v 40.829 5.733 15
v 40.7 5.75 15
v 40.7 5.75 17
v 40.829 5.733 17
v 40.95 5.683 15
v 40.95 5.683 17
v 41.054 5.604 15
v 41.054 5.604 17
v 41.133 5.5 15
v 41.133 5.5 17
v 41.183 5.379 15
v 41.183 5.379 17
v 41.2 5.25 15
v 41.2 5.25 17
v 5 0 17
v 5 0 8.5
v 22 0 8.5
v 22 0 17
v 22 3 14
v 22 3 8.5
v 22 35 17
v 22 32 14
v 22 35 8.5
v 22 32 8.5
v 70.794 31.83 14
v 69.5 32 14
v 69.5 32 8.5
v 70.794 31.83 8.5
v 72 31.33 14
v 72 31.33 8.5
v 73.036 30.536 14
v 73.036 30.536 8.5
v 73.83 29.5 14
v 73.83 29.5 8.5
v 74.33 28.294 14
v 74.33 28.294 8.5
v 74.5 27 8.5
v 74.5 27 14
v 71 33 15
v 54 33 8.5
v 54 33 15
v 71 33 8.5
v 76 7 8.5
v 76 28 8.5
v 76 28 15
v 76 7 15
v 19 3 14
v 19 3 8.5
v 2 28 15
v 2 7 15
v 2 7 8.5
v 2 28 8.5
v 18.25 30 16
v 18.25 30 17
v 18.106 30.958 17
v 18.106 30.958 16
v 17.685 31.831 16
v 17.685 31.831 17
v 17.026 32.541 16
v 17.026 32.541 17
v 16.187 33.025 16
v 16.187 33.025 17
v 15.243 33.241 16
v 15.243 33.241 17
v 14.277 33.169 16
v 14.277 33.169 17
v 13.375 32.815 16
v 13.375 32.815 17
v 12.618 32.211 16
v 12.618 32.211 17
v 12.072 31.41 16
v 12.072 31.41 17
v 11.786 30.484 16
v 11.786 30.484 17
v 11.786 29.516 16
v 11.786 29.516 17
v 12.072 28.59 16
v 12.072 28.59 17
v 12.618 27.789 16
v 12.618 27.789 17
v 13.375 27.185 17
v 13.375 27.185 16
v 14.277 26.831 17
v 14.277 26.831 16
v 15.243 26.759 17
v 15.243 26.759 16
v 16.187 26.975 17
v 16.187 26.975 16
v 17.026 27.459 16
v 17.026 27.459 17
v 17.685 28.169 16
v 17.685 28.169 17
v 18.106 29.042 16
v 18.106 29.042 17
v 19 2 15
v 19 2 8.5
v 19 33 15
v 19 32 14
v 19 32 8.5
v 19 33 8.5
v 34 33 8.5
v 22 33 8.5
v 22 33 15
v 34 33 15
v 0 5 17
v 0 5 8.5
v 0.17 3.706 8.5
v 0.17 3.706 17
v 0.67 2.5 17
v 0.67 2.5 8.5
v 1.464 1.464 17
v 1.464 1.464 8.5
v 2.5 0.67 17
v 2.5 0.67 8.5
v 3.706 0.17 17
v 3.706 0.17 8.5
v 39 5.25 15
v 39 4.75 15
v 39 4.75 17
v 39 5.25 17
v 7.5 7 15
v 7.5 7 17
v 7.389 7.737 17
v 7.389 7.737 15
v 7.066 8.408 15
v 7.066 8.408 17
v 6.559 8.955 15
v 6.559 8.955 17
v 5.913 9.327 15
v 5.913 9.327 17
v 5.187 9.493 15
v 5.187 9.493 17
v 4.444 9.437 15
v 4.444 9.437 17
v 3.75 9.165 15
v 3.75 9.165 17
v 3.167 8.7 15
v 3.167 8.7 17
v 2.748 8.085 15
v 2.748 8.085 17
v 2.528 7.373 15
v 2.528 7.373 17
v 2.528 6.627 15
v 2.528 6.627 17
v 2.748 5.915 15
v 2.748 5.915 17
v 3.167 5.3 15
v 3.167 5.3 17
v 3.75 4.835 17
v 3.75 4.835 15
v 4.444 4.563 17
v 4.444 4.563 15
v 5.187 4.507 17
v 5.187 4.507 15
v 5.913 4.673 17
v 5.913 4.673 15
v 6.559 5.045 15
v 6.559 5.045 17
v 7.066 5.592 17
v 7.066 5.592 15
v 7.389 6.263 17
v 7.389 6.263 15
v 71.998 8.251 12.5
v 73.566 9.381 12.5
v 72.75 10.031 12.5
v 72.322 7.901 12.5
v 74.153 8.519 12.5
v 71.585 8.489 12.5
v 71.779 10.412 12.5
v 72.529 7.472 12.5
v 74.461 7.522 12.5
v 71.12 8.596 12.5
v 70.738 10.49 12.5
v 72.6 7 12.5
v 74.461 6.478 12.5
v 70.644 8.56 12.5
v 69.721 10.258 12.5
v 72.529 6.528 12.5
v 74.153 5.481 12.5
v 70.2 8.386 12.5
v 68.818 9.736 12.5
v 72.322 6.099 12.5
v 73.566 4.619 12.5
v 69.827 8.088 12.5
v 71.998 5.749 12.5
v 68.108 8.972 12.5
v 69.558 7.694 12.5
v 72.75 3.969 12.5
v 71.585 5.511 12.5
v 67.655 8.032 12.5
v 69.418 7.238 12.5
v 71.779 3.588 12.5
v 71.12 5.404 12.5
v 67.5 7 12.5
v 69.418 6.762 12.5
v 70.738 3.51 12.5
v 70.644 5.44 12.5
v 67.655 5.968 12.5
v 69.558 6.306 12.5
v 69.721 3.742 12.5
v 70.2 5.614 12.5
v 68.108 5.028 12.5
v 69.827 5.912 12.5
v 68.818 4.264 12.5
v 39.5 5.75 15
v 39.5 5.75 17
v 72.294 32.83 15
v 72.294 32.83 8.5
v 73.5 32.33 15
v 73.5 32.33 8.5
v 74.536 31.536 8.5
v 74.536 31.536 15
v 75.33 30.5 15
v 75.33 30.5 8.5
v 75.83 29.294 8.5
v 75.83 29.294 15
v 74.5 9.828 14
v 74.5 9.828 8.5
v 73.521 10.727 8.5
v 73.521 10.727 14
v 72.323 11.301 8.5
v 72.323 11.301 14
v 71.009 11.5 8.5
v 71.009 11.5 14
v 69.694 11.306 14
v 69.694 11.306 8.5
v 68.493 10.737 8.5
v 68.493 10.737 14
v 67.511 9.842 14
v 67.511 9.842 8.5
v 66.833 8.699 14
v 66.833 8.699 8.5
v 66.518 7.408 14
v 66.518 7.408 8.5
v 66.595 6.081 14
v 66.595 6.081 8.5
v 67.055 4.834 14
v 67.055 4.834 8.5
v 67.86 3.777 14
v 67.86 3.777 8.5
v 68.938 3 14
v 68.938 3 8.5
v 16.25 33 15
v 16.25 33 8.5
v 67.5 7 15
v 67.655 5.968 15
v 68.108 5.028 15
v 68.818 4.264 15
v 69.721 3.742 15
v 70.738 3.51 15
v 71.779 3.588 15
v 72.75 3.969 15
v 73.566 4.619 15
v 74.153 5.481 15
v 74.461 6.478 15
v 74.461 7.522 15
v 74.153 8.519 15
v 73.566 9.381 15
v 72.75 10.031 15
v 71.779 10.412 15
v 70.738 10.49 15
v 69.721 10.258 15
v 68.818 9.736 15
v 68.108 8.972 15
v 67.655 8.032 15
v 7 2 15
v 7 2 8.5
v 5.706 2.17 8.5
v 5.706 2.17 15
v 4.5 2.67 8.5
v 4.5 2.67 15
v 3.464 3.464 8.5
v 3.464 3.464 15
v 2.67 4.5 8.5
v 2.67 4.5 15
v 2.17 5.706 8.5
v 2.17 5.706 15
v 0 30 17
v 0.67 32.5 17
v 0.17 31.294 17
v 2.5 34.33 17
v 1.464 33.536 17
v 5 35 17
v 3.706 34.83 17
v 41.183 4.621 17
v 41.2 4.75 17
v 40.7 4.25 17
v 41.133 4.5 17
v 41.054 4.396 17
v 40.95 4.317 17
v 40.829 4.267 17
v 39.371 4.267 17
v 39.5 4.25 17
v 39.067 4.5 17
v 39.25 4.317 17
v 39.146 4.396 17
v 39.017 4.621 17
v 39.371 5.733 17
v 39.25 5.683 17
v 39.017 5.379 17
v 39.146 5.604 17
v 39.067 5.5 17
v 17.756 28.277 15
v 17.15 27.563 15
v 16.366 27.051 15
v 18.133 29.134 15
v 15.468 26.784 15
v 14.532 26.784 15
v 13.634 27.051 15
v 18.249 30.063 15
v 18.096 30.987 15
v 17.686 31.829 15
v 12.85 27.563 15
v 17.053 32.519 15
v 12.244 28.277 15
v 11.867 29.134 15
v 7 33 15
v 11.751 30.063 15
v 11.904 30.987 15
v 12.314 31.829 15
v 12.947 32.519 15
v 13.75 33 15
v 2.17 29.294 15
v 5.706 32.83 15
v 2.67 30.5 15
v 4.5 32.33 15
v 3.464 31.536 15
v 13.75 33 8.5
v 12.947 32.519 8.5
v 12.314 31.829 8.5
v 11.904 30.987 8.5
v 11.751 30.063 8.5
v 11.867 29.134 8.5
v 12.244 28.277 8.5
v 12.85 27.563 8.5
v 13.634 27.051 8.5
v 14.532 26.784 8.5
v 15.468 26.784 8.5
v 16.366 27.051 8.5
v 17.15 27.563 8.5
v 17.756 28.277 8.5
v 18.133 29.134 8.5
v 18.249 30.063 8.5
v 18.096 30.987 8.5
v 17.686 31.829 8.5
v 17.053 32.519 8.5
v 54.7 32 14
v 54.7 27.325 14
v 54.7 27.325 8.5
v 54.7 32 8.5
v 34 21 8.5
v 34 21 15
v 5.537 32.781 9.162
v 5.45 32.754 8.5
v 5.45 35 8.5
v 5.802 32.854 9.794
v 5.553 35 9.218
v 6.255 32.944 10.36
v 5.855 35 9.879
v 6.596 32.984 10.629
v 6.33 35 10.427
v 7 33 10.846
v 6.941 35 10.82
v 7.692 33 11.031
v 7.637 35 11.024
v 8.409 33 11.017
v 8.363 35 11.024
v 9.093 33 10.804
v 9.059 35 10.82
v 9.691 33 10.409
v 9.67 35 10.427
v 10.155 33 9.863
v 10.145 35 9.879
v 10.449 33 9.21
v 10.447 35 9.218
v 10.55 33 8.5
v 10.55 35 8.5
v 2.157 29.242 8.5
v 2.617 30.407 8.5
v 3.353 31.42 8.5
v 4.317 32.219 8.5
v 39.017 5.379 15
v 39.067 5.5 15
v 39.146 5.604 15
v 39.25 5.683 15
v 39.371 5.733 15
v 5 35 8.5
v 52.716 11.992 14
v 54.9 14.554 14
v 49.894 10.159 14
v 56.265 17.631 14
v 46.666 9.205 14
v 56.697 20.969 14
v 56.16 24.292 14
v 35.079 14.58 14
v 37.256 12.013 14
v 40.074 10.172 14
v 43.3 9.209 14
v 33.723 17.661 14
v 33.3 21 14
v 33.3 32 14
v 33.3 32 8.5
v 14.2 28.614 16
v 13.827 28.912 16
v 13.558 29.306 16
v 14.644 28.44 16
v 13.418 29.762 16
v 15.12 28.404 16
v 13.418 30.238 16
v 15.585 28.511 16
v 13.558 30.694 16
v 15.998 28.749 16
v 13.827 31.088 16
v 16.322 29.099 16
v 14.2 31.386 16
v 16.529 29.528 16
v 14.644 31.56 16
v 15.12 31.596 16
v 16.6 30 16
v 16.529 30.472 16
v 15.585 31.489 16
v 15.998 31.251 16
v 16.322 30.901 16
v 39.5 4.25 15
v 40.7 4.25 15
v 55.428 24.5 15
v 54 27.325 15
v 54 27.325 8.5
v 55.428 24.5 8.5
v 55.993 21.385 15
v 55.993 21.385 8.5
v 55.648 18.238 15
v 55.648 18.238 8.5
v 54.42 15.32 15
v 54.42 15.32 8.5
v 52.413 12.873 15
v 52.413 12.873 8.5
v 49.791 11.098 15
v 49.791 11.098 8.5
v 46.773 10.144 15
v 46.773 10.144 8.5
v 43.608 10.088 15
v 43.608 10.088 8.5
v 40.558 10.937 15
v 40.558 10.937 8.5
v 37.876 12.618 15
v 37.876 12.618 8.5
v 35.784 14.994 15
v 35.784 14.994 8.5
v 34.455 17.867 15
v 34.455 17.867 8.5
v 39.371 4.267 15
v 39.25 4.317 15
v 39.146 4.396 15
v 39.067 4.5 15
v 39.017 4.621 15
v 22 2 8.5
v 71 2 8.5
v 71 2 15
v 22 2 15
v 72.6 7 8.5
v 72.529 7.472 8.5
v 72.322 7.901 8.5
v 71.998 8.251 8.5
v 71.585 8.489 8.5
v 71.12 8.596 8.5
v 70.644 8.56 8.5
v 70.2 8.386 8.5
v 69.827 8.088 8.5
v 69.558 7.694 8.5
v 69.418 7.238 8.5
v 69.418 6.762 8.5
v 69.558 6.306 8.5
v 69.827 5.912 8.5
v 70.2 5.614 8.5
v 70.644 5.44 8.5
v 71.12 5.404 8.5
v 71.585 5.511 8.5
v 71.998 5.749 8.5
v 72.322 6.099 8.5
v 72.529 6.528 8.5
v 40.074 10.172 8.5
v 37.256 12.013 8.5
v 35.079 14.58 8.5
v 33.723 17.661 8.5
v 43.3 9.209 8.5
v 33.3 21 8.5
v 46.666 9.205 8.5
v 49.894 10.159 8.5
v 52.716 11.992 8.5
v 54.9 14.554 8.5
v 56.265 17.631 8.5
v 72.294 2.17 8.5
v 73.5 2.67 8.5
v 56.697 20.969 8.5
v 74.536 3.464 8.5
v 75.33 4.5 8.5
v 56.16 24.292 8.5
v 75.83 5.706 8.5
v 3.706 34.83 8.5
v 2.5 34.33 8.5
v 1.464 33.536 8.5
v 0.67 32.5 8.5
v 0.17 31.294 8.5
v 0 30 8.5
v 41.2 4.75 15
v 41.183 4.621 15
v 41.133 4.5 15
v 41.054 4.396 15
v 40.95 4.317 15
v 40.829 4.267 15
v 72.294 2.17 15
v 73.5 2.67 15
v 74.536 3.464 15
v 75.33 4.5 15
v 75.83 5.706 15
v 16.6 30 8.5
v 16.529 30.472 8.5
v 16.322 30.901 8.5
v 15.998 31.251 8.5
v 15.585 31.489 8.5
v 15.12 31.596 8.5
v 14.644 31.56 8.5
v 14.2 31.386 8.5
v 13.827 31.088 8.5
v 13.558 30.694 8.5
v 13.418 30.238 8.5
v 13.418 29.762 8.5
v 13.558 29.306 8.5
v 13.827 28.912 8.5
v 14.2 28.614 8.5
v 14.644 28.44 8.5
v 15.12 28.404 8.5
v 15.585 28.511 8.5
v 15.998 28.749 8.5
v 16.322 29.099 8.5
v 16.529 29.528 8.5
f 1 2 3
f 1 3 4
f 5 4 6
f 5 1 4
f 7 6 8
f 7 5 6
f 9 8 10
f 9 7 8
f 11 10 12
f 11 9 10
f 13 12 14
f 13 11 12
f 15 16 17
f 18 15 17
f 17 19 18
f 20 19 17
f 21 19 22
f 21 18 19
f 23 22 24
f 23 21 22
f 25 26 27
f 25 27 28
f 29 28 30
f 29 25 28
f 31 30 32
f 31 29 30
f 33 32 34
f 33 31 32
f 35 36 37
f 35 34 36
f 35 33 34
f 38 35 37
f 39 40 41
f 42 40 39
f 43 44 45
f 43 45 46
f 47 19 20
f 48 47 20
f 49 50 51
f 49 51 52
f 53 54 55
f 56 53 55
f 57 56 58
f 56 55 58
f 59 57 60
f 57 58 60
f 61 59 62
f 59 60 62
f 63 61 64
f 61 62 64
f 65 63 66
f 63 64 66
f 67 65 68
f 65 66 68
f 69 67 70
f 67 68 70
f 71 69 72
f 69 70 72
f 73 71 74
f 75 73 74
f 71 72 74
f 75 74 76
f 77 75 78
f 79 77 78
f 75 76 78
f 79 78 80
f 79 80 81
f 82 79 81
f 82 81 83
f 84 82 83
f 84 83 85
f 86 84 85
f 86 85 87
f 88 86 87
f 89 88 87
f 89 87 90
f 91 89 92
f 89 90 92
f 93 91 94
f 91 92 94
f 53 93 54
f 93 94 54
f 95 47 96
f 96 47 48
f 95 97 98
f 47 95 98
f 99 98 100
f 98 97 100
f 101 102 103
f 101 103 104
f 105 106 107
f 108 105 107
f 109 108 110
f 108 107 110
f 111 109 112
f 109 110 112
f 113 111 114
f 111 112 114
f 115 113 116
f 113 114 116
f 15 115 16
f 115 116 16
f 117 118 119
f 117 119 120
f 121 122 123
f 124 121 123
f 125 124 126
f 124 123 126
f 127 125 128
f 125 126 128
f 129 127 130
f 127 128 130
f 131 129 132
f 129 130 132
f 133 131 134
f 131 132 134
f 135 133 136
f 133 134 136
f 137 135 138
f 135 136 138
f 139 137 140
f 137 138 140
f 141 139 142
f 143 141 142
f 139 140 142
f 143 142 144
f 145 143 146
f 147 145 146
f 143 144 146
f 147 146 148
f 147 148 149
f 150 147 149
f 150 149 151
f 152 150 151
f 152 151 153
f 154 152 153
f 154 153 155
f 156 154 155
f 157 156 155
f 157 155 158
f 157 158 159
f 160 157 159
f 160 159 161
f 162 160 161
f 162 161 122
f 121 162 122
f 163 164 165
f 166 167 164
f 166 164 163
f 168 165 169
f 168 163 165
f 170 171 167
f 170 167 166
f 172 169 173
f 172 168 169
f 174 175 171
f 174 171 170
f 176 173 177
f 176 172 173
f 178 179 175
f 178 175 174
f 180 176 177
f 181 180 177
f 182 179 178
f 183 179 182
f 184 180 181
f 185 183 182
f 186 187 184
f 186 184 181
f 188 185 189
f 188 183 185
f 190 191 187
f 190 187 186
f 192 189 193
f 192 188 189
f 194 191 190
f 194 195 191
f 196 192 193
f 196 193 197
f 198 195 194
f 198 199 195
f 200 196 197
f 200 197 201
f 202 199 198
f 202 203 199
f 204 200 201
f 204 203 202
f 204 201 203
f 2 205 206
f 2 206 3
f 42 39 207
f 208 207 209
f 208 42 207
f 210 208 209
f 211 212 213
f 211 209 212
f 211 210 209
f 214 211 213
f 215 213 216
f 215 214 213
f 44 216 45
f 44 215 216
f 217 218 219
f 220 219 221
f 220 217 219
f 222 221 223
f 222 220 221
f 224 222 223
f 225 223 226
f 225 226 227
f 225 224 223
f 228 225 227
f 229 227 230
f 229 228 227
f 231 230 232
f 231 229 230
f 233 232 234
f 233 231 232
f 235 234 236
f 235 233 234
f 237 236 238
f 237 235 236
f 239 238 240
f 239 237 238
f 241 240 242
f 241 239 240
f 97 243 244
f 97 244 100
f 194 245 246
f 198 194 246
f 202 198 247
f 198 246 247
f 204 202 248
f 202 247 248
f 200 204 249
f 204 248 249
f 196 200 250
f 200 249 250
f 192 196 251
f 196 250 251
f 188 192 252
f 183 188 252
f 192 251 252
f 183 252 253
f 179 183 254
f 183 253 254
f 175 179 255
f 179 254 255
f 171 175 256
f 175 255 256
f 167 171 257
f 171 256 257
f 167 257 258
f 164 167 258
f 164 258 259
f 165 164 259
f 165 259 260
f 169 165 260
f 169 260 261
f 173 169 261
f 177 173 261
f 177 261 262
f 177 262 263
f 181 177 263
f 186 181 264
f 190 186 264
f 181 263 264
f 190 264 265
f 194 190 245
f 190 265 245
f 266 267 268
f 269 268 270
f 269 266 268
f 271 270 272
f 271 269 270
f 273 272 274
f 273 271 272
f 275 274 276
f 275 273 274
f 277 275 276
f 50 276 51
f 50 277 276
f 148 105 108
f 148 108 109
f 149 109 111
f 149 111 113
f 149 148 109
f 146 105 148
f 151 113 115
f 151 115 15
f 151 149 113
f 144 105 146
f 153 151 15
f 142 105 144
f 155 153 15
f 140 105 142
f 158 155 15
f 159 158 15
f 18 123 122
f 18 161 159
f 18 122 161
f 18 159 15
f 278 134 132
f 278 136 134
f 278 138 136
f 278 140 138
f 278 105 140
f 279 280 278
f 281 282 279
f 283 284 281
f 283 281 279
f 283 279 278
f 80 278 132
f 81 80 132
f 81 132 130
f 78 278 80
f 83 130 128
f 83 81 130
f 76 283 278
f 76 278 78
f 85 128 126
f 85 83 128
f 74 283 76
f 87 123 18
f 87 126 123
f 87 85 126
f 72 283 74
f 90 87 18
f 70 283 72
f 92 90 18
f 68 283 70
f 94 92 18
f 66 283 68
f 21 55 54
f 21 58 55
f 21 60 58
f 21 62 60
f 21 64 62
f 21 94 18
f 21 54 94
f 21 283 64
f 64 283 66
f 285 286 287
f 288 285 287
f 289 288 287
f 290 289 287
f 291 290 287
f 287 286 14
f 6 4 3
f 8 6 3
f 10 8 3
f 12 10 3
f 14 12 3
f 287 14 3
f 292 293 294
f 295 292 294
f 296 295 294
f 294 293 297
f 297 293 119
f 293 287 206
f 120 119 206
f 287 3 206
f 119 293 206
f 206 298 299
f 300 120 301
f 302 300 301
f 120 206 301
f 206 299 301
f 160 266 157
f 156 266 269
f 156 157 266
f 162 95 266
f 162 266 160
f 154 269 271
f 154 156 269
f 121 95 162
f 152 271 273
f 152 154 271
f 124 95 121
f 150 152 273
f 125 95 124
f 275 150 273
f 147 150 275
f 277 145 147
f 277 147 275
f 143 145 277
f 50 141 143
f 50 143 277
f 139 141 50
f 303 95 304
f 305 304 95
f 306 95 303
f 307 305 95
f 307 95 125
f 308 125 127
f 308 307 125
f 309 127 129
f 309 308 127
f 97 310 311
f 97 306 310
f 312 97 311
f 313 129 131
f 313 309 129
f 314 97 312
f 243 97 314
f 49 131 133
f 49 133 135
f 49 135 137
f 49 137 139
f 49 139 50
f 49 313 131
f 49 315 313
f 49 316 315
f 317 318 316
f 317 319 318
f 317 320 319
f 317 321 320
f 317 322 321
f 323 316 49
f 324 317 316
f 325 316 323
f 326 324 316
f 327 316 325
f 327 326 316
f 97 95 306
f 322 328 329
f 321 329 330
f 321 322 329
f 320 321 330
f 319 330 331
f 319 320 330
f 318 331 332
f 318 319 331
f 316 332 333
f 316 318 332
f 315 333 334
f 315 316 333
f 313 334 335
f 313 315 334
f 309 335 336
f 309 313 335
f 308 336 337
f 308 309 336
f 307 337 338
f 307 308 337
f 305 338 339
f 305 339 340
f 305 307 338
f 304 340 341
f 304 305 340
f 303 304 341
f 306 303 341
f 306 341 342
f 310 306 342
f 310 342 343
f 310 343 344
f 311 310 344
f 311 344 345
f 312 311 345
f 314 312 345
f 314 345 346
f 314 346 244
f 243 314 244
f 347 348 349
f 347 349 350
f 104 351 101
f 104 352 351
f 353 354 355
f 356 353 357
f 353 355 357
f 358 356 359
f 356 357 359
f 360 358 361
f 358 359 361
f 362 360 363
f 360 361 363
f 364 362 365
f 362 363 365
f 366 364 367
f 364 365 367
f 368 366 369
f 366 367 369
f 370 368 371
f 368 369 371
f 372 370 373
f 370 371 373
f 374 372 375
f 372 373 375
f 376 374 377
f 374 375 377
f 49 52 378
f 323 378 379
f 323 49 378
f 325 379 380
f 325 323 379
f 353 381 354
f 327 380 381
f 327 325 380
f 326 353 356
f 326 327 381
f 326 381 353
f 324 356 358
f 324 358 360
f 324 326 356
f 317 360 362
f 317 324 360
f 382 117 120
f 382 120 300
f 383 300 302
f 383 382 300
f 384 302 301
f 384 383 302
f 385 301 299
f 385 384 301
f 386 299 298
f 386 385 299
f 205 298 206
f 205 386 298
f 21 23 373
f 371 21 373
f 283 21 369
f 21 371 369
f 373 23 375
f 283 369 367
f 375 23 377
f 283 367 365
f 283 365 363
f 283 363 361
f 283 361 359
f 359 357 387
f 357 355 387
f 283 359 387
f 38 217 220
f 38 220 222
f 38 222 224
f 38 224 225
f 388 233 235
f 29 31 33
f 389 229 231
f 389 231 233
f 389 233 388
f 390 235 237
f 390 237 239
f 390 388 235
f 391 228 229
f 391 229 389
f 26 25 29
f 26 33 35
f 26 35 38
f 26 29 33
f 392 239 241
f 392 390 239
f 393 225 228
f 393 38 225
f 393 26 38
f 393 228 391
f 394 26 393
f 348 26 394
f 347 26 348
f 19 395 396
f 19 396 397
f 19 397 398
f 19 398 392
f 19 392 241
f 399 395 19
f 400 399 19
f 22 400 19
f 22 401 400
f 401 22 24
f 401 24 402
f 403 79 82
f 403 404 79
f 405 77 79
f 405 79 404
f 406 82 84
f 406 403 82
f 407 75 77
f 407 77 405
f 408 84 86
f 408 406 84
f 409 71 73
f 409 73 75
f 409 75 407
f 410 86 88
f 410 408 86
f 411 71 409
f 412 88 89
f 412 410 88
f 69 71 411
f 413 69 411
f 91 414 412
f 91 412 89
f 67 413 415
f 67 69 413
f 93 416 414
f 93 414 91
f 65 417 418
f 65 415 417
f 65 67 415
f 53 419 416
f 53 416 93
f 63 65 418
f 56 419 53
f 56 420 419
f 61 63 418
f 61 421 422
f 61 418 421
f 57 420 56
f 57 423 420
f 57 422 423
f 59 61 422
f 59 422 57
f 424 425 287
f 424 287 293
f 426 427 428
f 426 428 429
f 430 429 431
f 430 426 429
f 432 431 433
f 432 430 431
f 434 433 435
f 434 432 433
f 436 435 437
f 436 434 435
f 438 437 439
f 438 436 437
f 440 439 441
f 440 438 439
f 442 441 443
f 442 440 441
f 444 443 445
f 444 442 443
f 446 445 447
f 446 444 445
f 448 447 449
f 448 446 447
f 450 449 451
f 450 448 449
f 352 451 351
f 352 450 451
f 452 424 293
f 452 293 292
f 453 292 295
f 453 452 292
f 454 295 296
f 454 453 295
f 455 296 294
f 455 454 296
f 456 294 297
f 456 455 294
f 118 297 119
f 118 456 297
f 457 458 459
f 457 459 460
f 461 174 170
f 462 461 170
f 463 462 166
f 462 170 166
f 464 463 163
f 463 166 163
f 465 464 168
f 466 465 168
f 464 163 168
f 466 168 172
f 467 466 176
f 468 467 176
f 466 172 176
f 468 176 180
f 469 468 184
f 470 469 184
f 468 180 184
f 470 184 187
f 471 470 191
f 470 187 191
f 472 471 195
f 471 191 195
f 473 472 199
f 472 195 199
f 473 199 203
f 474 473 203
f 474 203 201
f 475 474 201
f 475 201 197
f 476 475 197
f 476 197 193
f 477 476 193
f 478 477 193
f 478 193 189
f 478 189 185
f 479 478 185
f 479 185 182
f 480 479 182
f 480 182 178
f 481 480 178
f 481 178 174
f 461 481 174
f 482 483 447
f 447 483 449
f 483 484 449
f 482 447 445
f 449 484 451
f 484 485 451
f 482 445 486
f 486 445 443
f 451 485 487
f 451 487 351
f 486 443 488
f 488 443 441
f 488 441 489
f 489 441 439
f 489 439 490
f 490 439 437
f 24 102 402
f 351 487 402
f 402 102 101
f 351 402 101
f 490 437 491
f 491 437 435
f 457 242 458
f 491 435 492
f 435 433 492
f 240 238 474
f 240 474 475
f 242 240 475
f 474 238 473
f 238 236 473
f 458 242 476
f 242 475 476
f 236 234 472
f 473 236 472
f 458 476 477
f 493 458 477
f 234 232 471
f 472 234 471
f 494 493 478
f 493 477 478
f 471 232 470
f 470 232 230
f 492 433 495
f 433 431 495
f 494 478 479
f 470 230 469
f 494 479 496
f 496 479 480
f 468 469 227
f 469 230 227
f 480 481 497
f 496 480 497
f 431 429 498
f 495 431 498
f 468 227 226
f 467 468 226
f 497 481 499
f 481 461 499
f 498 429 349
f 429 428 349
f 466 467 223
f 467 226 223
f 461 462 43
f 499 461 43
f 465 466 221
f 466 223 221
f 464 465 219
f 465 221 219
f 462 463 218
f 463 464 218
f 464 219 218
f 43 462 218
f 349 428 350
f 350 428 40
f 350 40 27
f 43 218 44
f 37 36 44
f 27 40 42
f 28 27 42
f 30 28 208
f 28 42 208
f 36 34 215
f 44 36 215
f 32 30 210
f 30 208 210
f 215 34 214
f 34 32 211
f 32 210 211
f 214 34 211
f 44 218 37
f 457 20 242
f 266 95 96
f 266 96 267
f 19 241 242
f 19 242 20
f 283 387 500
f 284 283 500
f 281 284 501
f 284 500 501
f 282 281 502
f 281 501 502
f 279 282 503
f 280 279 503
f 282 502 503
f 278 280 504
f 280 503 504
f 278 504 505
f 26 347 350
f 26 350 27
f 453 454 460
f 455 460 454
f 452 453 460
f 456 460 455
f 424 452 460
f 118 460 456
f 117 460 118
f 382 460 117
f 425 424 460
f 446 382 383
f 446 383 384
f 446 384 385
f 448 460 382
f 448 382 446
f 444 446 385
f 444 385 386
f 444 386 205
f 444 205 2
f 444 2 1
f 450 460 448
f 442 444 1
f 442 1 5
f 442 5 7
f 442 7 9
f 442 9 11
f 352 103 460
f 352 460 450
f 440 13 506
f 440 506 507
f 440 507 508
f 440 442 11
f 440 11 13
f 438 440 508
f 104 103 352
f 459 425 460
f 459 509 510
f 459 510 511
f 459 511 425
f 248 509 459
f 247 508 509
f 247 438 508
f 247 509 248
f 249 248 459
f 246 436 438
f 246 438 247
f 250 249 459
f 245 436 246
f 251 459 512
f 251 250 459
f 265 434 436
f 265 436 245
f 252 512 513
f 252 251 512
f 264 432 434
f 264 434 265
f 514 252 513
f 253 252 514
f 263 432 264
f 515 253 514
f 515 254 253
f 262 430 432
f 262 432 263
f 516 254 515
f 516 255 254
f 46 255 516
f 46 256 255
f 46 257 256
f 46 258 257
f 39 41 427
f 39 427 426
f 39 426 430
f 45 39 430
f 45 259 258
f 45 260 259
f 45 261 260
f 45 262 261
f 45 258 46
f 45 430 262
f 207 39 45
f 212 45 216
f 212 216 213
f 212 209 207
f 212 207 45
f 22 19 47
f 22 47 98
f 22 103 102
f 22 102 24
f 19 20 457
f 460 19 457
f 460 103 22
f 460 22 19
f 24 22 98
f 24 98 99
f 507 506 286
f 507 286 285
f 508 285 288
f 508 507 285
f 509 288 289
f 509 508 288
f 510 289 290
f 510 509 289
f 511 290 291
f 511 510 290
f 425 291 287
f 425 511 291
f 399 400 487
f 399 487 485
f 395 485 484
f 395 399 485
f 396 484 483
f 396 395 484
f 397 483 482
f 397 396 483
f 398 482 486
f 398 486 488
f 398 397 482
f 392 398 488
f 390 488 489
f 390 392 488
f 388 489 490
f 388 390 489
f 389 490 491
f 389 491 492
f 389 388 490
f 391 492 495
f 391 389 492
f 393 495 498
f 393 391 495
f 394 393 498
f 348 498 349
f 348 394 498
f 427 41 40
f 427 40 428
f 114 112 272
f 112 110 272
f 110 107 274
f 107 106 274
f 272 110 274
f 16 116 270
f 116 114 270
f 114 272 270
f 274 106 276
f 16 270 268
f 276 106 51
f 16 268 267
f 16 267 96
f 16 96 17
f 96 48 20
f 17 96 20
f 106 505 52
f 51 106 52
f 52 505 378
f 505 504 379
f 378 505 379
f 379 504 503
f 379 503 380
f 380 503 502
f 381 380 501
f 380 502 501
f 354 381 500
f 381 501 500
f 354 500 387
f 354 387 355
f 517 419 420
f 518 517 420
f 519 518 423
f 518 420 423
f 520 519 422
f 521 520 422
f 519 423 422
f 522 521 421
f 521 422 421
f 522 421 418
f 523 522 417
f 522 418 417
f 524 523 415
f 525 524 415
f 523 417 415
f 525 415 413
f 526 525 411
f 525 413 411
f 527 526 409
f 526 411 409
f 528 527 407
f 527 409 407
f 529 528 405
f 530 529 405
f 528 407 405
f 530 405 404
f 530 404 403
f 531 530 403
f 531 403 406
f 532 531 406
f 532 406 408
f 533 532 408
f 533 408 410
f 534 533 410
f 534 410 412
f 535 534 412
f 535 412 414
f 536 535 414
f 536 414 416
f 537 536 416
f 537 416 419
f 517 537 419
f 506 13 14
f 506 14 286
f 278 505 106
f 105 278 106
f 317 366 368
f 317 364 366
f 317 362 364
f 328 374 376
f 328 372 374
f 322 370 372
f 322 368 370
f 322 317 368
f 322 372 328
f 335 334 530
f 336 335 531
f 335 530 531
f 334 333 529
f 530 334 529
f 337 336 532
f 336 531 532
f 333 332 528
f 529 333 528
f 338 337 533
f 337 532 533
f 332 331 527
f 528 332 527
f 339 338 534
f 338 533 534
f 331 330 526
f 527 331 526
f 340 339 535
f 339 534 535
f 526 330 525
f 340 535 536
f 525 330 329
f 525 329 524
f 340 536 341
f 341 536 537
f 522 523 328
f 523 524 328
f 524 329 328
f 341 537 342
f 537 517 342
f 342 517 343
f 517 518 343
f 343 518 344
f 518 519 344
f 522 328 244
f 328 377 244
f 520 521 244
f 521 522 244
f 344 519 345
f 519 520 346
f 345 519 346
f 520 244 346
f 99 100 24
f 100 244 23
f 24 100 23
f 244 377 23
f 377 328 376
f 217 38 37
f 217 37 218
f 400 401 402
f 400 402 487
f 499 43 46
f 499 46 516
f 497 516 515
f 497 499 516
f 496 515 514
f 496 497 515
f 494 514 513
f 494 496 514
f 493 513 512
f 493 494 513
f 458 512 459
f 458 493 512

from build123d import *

# Parameters (mm, degrees)
BOSS_EXTRUDE1_DEPTH  = 17
CUT_EXTRUDE1_START   = -17
SKETCH3_W            = 12
SKETCH3_H            = 2
CUT_EXTRUDE1_DEPTH   = 17
CUT_EXTRUDE2_START   = -2
CUT_EXTRUDE2_DEPTH   = 2
SKETCH5_W            = 60
SKETCH5_H            = 35
CUT_EXTRUDE3_DEPTH   = 2
CUT_EXTRUDE4_DEPTH   = 11
CUT_EXTRUDE11_DEPTH  = 13
BOSS_EXTRUDE2_DEPTH  = 2
SKETCH13_R           = 2.5
CUT_EXTRUDE12_DEPTH  = 5
SKETCH14_R           = 2.55
CUT_EXTRUDE14_DEPTH  = 15
BOSS_EXTRUDE5_REACH  = 87.381
SKETCH15_R           = 3.25
SKETCH15_R_2         = 1.6
SKETCH15_4_R         = 3.25
SKETCH15_4_R_2       = 1.6
CUT_EXTRUDE16_DEPTH  = 1
SKETCH18_R           = 1.6
CUT_EXTRUDE17_DEPTH  = 15
SKETCH20_R           = 4.5
SKETCH20_R_2         = 1.6
BOSS_EXTRUDE6_DEPTH  = 13
SKETCH20_3_R         = 1.6
CUT_EXTRUDE20_DEPTH  = 86.005882191
SKETCH22_W           = 13
SKETCH22_H           = 31
SKETCH22_W_2         = 11
SKETCH22_H_2         = 29
BOSS_EXTRUDE7_DEPTH  = 3
SKETCH21_R           = 3.5
CUT_EXTRUDE21_DEPTH  = 2
SKETCH29_R           = 3.5
CUT_EXTRUDE22_DEPTH  = 2.5
BOSS_EXTRUDE10_DEPTH = 13
SKETCH24_W           = 80
SKETCH24_H           = 36
CUT_EXTRUDE23_DEPTH  = 10


with BuildPart() as part:
    # Sketch1 → Boss-Extrude1 (new body)
    with BuildSketch(Plane.XY):
        with BuildLine():
            ThreePointArc((0, 5), (1.464466094, 1.464466094), (5, 0))
            Line((5, 0), (73, 0))
            ThreePointArc((73, 0), (76.535533906, 1.464466094), (78, 5))
            Line((78, 5), (78, 30))
            ThreePointArc((78, 30), (76.535533906, 33.535533906), (73, 35))
            Line((73, 35), (54, 35))
            Line((54, 35), (54, 27.32455532))
            ThreePointArc((54, 27.32455532), (48.31662479, 10.511911518), (34, 21))
            Line((34, 21), (34, 35))
            Line((34, 35), (5, 35))
            ThreePointArc((5, 35), (1.464466094, 33.535533906), (0, 30))
            Line((0, 30), (0, 5))
        make_face()
    extrude(amount=BOSS_EXTRUDE1_DEPTH)

    # Sketch3 → Cut-Extrude1 (cut)
    with BuildSketch(Plane.XY.offset(17).offset(CUT_EXTRUDE1_START)):
        with Locations((28, 34)):
            Rectangle(SKETCH3_W, SKETCH3_H)
        with BuildLine():
            Line((54, 33), (71, 33))
            ThreePointArc((71, 33), (74.535533906, 31.535533906), (76, 28))
            Line((76, 28), (76, 7))
            ThreePointArc((76, 7), (74.535533906, 3.464466094), (71, 2))
            Line((71, 2), (22, 2))
            Line((22, 2), (22, 0))
            Line((22, 0), (73, 0))
            ThreePointArc((73, 0), (76.535533906, 1.464466094), (78, 5))
            Line((78, 5), (78, 30))
            ThreePointArc((78, 30), (76.535533906, 33.535533906), (73, 35))
            Line((73, 35), (54, 35))
            Line((54, 35), (54, 33))
        make_face()
    extrude(amount=CUT_EXTRUDE1_DEPTH, mode=Mode.SUBTRACT)

    # Sketch3<3> → Cut-Extrude2 (cut)
    with BuildSketch(Plane.XY.offset(17).offset(CUT_EXTRUDE2_START)):
        with BuildLine():
            ThreePointArc((76, 28), (74.535533906, 31.535533906), (71, 33))
            Line((71, 33), (54, 33))
            Line((54, 33), (54, 27.32455532))
            ThreePointArc((54, 27.32455532), (48.31662479, 10.511911518), (34, 21))
            Line((34, 21), (34, 33))
            Line((34, 33), (22, 33))
            Line((22, 33), (22, 2))
            Line((22, 2), (71, 2))
            ThreePointArc((71, 2), (74.535533906, 3.464466094), (76, 7))
            Line((76, 7), (76, 28))
        make_face()
    extrude(amount=CUT_EXTRUDE2_DEPTH, mode=Mode.SUBTRACT)

    # Sketch5 → Cut-Extrude3 (cut)
    with BuildSketch(Plane(origin=(0, 0, 0), x_dir=(-1, 0, 0), z_dir=(0, 0, -1))):
        with Locations((-52, 15.5)):
            Rectangle(SKETCH5_W, SKETCH5_H)
    extrude(amount=-CUT_EXTRUDE3_DEPTH, mode=Mode.SUBTRACT)

    # Sketch6 → Cut-Extrude4 (cut)
    with BuildSketch(Plane.XY.offset(14)):
        with BuildLine():
            Line((22, 32), (69.5, 32))
            ThreePointArc((69.5, 32), (73.035533906, 30.535533906), (74.5, 27))
            Line((74.5, 27), (74.5, 8))
            ThreePointArc((74.5, 8), (73.035533906, 4.464466094), (69.5, 3))
            Line((69.5, 3), (22, 3))
            Line((22, 3), (22, 32))
        make_face()
    extrude(amount=-CUT_EXTRUDE4_DEPTH, mode=Mode.SUBTRACT)

    # Sketch11 → Cut-Extrude11 (cut)
    with BuildSketch(Plane.XY.offset(15)):
        with BuildLine():
            Line((22, 2), (7, 2))
            ThreePointArc((7, 2), (3.464466094, 3.464466094), (2, 7))
            Line((2, 7), (2, 28))
            ThreePointArc((2, 28), (3.464466094, 31.535533906), (7, 33))
            Line((7, 33), (22, 33))
            Line((22, 33), (22, 2))
        make_face()
    extrude(amount=-CUT_EXTRUDE11_DEPTH, mode=Mode.SUBTRACT)


with BuildPart() as cut_extrude11_piece_1:
    # of the separate pieces the step leaves, piece 1, a body of its own (cut_extrude11_pieces)
    add(part.part.solids().sort_by_distance((0, 30, 0))[0])

    # Sketch13 → Cut-Extrude12 (cut)
    with BuildSketch(Plane.XY.offset(17)):
        with Locations((5, 7)):
            Circle(SKETCH13_R)
    extrude(amount=-CUT_EXTRUDE12_DEPTH, mode=Mode.SUBTRACT)

    # Sketch14 → Cut-Extrude14 (cut)
    with BuildSketch(Plane(origin=(0, 35, 0), x_dir=(1, 0, 0), z_dir=(0, 1, 0))):
        with Locations(Location((8, -8.5, 0), (0, 0, 270))):
            Circle(SKETCH14_R)
    extrude(amount=-CUT_EXTRUDE14_DEPTH, mode=Mode.SUBTRACT)

    # Sketch15 → Boss-Extrude5 (add, up to next)
    with BuildSketch(Plane.XY.offset(17), mode=Mode.PRIVATE) as boss_extrude5_sk1:
        with Locations((15, 30)):
            Circle(SKETCH15_R)
        with Locations((15, 30)):
            Circle(SKETCH15_R_2, mode=Mode.SUBTRACT)
    boss_extrude5_tool1 = extrude(boss_extrude5_sk1.sketch, amount=-BOSS_EXTRUDE5_REACH, mode=Mode.PRIVATE) - cut_extrude11_piece_1.part
    add(boss_extrude5_tool1.solids().sort_by_distance((11.841924, 30, 17))[0])

    # Sketch15<4> → Cut-Extrude16 (cut)
    with BuildSketch(Plane.XY.offset(17)):
        with Locations((15, 30)):
            Circle(SKETCH15_4_R)
        with Locations((15, 30)):
            Circle(SKETCH15_4_R_2, mode=Mode.SUBTRACT)
    extrude(amount=-CUT_EXTRUDE16_DEPTH, mode=Mode.SUBTRACT)

    # Sketch18 → Cut-Extrude17 (cut)
    with BuildSketch(Plane.XY.offset(17)):
        with Locations((15, 30)):
            Circle(SKETCH18_R)
    extrude(amount=-CUT_EXTRUDE17_DEPTH, mode=Mode.SUBTRACT)

    # Sketch22 → Boss-Extrude7 (add)
    with BuildSketch(Plane(origin=(22, 0, 0), x_dir=(0, 0, -1), z_dir=(1, 0, 0))):
        with Locations((-8.5, 17.5)):
            Rectangle(SKETCH22_W, SKETCH22_H)
        with Locations((-8.5, 17.5)):
            Rectangle(SKETCH22_W_2, SKETCH22_H_2, mode=Mode.SUBTRACT)
    extrude(amount=-BOSS_EXTRUDE7_DEPTH)


with BuildPart() as cut_extrude11_piece_2:
    # of the separate pieces the step leaves, piece 2, a body of its own (cut_extrude11_pieces)
    add(part.part.solids().sort_by_distance((34, 33, 2))[0])

    # Sketch12 → Boss-Extrude2 (add)
    with BuildSketch(Plane.XY.offset(15)):
        with BuildLine():
            Line((39.5, 5.75), (40.7, 5.75))
            ThreePointArc((40.7, 5.75), (41.053553391, 5.603553391), (41.2, 5.25))
            Line((41.2, 5.25), (41.2, 4.75))
            ThreePointArc((41.2, 4.75), (41.053553391, 4.396446609), (40.7, 4.25))
            Line((40.7, 4.25), (39.5, 4.25))
            ThreePointArc((39.5, 4.25), (39.146446609, 4.396446609), (39, 4.75))
            Line((39, 4.75), (39, 5.25))
            ThreePointArc((39, 5.25), (39.146446609, 5.603553391), (39.5, 5.75))
        make_face()
    extrude(amount=BOSS_EXTRUDE2_DEPTH)

    # Sketch20 → Boss-Extrude6 (add)
    with BuildSketch(Plane.XY.offset(15)):
        with Locations((71, 7)):
            Circle(SKETCH20_R)
        with Locations((71, 7)):
            Circle(SKETCH20_R_2, mode=Mode.SUBTRACT)
    extrude(amount=-BOSS_EXTRUDE6_DEPTH)

    # Sketch20<3> → Cut-Extrude20 (cut, through all)
    with BuildSketch(Plane.XY.offset(15)):
        with Locations((71, 7)):
            Circle(SKETCH20_3_R)
    extrude(amount=-CUT_EXTRUDE20_DEPTH, mode=Mode.SUBTRACT)

    # Sketch21 → Cut-Extrude21 (cut)
    with BuildSketch(Plane(origin=(0, 0, 2), x_dir=(-1, 0, 0), z_dir=(0, 0, -1))):
        with Locations((-71, 7)):
            Circle(SKETCH21_R)
    extrude(amount=-CUT_EXTRUDE21_DEPTH, mode=Mode.SUBTRACT)

    # Sketch29 → Cut-Extrude22 (cut)
    with BuildSketch(Plane.XY.offset(15)):
        with Locations(Location((71, 7, 0), (0, 0, 180))):
            Circle(SKETCH29_R)
    extrude(amount=-CUT_EXTRUDE22_DEPTH, mode=Mode.SUBTRACT)

    # Sketch36 → Boss-Extrude10 (add)
    with BuildSketch(Plane.XY.offset(15)):
        with BuildLine():
            Line((34, 21), (34, 33))
            Line((34, 33), (33.3, 33))
            Line((33.3, 33), (33.3, 21))
            ThreePointArc((33.3, 21), (48.314061384, 9.565059525), (54.7, 27.32455532))
            Line((54.7, 27.32455532), (54.7, 33))
            Line((54.7, 33), (54, 33))
            Line((54, 33), (54, 27.32455532))
            ThreePointArc((54, 27.32455532), (48.31662479, 10.511911518), (34, 21))
        make_face()
    extrude(amount=-BOSS_EXTRUDE10_DEPTH)


with BuildPart() as cut_extrude23_tool:
    # Sketch24 → Cut-Extrude23 (new body)
    with BuildSketch(Plane.XY.offset(8.5)):
        with Locations((40, 18)):
            Rectangle(SKETCH24_W, SKETCH24_H)
    extrude(amount=-CUT_EXTRUDE23_DEPTH)


with BuildPart() as cut_extrude11_piece_1_1:
    add(cut_extrude11_piece_1.part)

    # Cut-Extrude23: cut by cut_extrude23_tool
    add(cut_extrude23_tool.part, mode=Mode.SUBTRACT)


with BuildPart() as cut_extrude11_piece_2_1:
    add(cut_extrude11_piece_2.part)

    # Cut-Extrude23: cut by cut_extrude23_tool
    add(cut_extrude23_tool.part, mode=Mode.SUBTRACT)


solid = Compound([cut_extrude11_piece_1_1.part, cut_extrude11_piece_2_1.part])
